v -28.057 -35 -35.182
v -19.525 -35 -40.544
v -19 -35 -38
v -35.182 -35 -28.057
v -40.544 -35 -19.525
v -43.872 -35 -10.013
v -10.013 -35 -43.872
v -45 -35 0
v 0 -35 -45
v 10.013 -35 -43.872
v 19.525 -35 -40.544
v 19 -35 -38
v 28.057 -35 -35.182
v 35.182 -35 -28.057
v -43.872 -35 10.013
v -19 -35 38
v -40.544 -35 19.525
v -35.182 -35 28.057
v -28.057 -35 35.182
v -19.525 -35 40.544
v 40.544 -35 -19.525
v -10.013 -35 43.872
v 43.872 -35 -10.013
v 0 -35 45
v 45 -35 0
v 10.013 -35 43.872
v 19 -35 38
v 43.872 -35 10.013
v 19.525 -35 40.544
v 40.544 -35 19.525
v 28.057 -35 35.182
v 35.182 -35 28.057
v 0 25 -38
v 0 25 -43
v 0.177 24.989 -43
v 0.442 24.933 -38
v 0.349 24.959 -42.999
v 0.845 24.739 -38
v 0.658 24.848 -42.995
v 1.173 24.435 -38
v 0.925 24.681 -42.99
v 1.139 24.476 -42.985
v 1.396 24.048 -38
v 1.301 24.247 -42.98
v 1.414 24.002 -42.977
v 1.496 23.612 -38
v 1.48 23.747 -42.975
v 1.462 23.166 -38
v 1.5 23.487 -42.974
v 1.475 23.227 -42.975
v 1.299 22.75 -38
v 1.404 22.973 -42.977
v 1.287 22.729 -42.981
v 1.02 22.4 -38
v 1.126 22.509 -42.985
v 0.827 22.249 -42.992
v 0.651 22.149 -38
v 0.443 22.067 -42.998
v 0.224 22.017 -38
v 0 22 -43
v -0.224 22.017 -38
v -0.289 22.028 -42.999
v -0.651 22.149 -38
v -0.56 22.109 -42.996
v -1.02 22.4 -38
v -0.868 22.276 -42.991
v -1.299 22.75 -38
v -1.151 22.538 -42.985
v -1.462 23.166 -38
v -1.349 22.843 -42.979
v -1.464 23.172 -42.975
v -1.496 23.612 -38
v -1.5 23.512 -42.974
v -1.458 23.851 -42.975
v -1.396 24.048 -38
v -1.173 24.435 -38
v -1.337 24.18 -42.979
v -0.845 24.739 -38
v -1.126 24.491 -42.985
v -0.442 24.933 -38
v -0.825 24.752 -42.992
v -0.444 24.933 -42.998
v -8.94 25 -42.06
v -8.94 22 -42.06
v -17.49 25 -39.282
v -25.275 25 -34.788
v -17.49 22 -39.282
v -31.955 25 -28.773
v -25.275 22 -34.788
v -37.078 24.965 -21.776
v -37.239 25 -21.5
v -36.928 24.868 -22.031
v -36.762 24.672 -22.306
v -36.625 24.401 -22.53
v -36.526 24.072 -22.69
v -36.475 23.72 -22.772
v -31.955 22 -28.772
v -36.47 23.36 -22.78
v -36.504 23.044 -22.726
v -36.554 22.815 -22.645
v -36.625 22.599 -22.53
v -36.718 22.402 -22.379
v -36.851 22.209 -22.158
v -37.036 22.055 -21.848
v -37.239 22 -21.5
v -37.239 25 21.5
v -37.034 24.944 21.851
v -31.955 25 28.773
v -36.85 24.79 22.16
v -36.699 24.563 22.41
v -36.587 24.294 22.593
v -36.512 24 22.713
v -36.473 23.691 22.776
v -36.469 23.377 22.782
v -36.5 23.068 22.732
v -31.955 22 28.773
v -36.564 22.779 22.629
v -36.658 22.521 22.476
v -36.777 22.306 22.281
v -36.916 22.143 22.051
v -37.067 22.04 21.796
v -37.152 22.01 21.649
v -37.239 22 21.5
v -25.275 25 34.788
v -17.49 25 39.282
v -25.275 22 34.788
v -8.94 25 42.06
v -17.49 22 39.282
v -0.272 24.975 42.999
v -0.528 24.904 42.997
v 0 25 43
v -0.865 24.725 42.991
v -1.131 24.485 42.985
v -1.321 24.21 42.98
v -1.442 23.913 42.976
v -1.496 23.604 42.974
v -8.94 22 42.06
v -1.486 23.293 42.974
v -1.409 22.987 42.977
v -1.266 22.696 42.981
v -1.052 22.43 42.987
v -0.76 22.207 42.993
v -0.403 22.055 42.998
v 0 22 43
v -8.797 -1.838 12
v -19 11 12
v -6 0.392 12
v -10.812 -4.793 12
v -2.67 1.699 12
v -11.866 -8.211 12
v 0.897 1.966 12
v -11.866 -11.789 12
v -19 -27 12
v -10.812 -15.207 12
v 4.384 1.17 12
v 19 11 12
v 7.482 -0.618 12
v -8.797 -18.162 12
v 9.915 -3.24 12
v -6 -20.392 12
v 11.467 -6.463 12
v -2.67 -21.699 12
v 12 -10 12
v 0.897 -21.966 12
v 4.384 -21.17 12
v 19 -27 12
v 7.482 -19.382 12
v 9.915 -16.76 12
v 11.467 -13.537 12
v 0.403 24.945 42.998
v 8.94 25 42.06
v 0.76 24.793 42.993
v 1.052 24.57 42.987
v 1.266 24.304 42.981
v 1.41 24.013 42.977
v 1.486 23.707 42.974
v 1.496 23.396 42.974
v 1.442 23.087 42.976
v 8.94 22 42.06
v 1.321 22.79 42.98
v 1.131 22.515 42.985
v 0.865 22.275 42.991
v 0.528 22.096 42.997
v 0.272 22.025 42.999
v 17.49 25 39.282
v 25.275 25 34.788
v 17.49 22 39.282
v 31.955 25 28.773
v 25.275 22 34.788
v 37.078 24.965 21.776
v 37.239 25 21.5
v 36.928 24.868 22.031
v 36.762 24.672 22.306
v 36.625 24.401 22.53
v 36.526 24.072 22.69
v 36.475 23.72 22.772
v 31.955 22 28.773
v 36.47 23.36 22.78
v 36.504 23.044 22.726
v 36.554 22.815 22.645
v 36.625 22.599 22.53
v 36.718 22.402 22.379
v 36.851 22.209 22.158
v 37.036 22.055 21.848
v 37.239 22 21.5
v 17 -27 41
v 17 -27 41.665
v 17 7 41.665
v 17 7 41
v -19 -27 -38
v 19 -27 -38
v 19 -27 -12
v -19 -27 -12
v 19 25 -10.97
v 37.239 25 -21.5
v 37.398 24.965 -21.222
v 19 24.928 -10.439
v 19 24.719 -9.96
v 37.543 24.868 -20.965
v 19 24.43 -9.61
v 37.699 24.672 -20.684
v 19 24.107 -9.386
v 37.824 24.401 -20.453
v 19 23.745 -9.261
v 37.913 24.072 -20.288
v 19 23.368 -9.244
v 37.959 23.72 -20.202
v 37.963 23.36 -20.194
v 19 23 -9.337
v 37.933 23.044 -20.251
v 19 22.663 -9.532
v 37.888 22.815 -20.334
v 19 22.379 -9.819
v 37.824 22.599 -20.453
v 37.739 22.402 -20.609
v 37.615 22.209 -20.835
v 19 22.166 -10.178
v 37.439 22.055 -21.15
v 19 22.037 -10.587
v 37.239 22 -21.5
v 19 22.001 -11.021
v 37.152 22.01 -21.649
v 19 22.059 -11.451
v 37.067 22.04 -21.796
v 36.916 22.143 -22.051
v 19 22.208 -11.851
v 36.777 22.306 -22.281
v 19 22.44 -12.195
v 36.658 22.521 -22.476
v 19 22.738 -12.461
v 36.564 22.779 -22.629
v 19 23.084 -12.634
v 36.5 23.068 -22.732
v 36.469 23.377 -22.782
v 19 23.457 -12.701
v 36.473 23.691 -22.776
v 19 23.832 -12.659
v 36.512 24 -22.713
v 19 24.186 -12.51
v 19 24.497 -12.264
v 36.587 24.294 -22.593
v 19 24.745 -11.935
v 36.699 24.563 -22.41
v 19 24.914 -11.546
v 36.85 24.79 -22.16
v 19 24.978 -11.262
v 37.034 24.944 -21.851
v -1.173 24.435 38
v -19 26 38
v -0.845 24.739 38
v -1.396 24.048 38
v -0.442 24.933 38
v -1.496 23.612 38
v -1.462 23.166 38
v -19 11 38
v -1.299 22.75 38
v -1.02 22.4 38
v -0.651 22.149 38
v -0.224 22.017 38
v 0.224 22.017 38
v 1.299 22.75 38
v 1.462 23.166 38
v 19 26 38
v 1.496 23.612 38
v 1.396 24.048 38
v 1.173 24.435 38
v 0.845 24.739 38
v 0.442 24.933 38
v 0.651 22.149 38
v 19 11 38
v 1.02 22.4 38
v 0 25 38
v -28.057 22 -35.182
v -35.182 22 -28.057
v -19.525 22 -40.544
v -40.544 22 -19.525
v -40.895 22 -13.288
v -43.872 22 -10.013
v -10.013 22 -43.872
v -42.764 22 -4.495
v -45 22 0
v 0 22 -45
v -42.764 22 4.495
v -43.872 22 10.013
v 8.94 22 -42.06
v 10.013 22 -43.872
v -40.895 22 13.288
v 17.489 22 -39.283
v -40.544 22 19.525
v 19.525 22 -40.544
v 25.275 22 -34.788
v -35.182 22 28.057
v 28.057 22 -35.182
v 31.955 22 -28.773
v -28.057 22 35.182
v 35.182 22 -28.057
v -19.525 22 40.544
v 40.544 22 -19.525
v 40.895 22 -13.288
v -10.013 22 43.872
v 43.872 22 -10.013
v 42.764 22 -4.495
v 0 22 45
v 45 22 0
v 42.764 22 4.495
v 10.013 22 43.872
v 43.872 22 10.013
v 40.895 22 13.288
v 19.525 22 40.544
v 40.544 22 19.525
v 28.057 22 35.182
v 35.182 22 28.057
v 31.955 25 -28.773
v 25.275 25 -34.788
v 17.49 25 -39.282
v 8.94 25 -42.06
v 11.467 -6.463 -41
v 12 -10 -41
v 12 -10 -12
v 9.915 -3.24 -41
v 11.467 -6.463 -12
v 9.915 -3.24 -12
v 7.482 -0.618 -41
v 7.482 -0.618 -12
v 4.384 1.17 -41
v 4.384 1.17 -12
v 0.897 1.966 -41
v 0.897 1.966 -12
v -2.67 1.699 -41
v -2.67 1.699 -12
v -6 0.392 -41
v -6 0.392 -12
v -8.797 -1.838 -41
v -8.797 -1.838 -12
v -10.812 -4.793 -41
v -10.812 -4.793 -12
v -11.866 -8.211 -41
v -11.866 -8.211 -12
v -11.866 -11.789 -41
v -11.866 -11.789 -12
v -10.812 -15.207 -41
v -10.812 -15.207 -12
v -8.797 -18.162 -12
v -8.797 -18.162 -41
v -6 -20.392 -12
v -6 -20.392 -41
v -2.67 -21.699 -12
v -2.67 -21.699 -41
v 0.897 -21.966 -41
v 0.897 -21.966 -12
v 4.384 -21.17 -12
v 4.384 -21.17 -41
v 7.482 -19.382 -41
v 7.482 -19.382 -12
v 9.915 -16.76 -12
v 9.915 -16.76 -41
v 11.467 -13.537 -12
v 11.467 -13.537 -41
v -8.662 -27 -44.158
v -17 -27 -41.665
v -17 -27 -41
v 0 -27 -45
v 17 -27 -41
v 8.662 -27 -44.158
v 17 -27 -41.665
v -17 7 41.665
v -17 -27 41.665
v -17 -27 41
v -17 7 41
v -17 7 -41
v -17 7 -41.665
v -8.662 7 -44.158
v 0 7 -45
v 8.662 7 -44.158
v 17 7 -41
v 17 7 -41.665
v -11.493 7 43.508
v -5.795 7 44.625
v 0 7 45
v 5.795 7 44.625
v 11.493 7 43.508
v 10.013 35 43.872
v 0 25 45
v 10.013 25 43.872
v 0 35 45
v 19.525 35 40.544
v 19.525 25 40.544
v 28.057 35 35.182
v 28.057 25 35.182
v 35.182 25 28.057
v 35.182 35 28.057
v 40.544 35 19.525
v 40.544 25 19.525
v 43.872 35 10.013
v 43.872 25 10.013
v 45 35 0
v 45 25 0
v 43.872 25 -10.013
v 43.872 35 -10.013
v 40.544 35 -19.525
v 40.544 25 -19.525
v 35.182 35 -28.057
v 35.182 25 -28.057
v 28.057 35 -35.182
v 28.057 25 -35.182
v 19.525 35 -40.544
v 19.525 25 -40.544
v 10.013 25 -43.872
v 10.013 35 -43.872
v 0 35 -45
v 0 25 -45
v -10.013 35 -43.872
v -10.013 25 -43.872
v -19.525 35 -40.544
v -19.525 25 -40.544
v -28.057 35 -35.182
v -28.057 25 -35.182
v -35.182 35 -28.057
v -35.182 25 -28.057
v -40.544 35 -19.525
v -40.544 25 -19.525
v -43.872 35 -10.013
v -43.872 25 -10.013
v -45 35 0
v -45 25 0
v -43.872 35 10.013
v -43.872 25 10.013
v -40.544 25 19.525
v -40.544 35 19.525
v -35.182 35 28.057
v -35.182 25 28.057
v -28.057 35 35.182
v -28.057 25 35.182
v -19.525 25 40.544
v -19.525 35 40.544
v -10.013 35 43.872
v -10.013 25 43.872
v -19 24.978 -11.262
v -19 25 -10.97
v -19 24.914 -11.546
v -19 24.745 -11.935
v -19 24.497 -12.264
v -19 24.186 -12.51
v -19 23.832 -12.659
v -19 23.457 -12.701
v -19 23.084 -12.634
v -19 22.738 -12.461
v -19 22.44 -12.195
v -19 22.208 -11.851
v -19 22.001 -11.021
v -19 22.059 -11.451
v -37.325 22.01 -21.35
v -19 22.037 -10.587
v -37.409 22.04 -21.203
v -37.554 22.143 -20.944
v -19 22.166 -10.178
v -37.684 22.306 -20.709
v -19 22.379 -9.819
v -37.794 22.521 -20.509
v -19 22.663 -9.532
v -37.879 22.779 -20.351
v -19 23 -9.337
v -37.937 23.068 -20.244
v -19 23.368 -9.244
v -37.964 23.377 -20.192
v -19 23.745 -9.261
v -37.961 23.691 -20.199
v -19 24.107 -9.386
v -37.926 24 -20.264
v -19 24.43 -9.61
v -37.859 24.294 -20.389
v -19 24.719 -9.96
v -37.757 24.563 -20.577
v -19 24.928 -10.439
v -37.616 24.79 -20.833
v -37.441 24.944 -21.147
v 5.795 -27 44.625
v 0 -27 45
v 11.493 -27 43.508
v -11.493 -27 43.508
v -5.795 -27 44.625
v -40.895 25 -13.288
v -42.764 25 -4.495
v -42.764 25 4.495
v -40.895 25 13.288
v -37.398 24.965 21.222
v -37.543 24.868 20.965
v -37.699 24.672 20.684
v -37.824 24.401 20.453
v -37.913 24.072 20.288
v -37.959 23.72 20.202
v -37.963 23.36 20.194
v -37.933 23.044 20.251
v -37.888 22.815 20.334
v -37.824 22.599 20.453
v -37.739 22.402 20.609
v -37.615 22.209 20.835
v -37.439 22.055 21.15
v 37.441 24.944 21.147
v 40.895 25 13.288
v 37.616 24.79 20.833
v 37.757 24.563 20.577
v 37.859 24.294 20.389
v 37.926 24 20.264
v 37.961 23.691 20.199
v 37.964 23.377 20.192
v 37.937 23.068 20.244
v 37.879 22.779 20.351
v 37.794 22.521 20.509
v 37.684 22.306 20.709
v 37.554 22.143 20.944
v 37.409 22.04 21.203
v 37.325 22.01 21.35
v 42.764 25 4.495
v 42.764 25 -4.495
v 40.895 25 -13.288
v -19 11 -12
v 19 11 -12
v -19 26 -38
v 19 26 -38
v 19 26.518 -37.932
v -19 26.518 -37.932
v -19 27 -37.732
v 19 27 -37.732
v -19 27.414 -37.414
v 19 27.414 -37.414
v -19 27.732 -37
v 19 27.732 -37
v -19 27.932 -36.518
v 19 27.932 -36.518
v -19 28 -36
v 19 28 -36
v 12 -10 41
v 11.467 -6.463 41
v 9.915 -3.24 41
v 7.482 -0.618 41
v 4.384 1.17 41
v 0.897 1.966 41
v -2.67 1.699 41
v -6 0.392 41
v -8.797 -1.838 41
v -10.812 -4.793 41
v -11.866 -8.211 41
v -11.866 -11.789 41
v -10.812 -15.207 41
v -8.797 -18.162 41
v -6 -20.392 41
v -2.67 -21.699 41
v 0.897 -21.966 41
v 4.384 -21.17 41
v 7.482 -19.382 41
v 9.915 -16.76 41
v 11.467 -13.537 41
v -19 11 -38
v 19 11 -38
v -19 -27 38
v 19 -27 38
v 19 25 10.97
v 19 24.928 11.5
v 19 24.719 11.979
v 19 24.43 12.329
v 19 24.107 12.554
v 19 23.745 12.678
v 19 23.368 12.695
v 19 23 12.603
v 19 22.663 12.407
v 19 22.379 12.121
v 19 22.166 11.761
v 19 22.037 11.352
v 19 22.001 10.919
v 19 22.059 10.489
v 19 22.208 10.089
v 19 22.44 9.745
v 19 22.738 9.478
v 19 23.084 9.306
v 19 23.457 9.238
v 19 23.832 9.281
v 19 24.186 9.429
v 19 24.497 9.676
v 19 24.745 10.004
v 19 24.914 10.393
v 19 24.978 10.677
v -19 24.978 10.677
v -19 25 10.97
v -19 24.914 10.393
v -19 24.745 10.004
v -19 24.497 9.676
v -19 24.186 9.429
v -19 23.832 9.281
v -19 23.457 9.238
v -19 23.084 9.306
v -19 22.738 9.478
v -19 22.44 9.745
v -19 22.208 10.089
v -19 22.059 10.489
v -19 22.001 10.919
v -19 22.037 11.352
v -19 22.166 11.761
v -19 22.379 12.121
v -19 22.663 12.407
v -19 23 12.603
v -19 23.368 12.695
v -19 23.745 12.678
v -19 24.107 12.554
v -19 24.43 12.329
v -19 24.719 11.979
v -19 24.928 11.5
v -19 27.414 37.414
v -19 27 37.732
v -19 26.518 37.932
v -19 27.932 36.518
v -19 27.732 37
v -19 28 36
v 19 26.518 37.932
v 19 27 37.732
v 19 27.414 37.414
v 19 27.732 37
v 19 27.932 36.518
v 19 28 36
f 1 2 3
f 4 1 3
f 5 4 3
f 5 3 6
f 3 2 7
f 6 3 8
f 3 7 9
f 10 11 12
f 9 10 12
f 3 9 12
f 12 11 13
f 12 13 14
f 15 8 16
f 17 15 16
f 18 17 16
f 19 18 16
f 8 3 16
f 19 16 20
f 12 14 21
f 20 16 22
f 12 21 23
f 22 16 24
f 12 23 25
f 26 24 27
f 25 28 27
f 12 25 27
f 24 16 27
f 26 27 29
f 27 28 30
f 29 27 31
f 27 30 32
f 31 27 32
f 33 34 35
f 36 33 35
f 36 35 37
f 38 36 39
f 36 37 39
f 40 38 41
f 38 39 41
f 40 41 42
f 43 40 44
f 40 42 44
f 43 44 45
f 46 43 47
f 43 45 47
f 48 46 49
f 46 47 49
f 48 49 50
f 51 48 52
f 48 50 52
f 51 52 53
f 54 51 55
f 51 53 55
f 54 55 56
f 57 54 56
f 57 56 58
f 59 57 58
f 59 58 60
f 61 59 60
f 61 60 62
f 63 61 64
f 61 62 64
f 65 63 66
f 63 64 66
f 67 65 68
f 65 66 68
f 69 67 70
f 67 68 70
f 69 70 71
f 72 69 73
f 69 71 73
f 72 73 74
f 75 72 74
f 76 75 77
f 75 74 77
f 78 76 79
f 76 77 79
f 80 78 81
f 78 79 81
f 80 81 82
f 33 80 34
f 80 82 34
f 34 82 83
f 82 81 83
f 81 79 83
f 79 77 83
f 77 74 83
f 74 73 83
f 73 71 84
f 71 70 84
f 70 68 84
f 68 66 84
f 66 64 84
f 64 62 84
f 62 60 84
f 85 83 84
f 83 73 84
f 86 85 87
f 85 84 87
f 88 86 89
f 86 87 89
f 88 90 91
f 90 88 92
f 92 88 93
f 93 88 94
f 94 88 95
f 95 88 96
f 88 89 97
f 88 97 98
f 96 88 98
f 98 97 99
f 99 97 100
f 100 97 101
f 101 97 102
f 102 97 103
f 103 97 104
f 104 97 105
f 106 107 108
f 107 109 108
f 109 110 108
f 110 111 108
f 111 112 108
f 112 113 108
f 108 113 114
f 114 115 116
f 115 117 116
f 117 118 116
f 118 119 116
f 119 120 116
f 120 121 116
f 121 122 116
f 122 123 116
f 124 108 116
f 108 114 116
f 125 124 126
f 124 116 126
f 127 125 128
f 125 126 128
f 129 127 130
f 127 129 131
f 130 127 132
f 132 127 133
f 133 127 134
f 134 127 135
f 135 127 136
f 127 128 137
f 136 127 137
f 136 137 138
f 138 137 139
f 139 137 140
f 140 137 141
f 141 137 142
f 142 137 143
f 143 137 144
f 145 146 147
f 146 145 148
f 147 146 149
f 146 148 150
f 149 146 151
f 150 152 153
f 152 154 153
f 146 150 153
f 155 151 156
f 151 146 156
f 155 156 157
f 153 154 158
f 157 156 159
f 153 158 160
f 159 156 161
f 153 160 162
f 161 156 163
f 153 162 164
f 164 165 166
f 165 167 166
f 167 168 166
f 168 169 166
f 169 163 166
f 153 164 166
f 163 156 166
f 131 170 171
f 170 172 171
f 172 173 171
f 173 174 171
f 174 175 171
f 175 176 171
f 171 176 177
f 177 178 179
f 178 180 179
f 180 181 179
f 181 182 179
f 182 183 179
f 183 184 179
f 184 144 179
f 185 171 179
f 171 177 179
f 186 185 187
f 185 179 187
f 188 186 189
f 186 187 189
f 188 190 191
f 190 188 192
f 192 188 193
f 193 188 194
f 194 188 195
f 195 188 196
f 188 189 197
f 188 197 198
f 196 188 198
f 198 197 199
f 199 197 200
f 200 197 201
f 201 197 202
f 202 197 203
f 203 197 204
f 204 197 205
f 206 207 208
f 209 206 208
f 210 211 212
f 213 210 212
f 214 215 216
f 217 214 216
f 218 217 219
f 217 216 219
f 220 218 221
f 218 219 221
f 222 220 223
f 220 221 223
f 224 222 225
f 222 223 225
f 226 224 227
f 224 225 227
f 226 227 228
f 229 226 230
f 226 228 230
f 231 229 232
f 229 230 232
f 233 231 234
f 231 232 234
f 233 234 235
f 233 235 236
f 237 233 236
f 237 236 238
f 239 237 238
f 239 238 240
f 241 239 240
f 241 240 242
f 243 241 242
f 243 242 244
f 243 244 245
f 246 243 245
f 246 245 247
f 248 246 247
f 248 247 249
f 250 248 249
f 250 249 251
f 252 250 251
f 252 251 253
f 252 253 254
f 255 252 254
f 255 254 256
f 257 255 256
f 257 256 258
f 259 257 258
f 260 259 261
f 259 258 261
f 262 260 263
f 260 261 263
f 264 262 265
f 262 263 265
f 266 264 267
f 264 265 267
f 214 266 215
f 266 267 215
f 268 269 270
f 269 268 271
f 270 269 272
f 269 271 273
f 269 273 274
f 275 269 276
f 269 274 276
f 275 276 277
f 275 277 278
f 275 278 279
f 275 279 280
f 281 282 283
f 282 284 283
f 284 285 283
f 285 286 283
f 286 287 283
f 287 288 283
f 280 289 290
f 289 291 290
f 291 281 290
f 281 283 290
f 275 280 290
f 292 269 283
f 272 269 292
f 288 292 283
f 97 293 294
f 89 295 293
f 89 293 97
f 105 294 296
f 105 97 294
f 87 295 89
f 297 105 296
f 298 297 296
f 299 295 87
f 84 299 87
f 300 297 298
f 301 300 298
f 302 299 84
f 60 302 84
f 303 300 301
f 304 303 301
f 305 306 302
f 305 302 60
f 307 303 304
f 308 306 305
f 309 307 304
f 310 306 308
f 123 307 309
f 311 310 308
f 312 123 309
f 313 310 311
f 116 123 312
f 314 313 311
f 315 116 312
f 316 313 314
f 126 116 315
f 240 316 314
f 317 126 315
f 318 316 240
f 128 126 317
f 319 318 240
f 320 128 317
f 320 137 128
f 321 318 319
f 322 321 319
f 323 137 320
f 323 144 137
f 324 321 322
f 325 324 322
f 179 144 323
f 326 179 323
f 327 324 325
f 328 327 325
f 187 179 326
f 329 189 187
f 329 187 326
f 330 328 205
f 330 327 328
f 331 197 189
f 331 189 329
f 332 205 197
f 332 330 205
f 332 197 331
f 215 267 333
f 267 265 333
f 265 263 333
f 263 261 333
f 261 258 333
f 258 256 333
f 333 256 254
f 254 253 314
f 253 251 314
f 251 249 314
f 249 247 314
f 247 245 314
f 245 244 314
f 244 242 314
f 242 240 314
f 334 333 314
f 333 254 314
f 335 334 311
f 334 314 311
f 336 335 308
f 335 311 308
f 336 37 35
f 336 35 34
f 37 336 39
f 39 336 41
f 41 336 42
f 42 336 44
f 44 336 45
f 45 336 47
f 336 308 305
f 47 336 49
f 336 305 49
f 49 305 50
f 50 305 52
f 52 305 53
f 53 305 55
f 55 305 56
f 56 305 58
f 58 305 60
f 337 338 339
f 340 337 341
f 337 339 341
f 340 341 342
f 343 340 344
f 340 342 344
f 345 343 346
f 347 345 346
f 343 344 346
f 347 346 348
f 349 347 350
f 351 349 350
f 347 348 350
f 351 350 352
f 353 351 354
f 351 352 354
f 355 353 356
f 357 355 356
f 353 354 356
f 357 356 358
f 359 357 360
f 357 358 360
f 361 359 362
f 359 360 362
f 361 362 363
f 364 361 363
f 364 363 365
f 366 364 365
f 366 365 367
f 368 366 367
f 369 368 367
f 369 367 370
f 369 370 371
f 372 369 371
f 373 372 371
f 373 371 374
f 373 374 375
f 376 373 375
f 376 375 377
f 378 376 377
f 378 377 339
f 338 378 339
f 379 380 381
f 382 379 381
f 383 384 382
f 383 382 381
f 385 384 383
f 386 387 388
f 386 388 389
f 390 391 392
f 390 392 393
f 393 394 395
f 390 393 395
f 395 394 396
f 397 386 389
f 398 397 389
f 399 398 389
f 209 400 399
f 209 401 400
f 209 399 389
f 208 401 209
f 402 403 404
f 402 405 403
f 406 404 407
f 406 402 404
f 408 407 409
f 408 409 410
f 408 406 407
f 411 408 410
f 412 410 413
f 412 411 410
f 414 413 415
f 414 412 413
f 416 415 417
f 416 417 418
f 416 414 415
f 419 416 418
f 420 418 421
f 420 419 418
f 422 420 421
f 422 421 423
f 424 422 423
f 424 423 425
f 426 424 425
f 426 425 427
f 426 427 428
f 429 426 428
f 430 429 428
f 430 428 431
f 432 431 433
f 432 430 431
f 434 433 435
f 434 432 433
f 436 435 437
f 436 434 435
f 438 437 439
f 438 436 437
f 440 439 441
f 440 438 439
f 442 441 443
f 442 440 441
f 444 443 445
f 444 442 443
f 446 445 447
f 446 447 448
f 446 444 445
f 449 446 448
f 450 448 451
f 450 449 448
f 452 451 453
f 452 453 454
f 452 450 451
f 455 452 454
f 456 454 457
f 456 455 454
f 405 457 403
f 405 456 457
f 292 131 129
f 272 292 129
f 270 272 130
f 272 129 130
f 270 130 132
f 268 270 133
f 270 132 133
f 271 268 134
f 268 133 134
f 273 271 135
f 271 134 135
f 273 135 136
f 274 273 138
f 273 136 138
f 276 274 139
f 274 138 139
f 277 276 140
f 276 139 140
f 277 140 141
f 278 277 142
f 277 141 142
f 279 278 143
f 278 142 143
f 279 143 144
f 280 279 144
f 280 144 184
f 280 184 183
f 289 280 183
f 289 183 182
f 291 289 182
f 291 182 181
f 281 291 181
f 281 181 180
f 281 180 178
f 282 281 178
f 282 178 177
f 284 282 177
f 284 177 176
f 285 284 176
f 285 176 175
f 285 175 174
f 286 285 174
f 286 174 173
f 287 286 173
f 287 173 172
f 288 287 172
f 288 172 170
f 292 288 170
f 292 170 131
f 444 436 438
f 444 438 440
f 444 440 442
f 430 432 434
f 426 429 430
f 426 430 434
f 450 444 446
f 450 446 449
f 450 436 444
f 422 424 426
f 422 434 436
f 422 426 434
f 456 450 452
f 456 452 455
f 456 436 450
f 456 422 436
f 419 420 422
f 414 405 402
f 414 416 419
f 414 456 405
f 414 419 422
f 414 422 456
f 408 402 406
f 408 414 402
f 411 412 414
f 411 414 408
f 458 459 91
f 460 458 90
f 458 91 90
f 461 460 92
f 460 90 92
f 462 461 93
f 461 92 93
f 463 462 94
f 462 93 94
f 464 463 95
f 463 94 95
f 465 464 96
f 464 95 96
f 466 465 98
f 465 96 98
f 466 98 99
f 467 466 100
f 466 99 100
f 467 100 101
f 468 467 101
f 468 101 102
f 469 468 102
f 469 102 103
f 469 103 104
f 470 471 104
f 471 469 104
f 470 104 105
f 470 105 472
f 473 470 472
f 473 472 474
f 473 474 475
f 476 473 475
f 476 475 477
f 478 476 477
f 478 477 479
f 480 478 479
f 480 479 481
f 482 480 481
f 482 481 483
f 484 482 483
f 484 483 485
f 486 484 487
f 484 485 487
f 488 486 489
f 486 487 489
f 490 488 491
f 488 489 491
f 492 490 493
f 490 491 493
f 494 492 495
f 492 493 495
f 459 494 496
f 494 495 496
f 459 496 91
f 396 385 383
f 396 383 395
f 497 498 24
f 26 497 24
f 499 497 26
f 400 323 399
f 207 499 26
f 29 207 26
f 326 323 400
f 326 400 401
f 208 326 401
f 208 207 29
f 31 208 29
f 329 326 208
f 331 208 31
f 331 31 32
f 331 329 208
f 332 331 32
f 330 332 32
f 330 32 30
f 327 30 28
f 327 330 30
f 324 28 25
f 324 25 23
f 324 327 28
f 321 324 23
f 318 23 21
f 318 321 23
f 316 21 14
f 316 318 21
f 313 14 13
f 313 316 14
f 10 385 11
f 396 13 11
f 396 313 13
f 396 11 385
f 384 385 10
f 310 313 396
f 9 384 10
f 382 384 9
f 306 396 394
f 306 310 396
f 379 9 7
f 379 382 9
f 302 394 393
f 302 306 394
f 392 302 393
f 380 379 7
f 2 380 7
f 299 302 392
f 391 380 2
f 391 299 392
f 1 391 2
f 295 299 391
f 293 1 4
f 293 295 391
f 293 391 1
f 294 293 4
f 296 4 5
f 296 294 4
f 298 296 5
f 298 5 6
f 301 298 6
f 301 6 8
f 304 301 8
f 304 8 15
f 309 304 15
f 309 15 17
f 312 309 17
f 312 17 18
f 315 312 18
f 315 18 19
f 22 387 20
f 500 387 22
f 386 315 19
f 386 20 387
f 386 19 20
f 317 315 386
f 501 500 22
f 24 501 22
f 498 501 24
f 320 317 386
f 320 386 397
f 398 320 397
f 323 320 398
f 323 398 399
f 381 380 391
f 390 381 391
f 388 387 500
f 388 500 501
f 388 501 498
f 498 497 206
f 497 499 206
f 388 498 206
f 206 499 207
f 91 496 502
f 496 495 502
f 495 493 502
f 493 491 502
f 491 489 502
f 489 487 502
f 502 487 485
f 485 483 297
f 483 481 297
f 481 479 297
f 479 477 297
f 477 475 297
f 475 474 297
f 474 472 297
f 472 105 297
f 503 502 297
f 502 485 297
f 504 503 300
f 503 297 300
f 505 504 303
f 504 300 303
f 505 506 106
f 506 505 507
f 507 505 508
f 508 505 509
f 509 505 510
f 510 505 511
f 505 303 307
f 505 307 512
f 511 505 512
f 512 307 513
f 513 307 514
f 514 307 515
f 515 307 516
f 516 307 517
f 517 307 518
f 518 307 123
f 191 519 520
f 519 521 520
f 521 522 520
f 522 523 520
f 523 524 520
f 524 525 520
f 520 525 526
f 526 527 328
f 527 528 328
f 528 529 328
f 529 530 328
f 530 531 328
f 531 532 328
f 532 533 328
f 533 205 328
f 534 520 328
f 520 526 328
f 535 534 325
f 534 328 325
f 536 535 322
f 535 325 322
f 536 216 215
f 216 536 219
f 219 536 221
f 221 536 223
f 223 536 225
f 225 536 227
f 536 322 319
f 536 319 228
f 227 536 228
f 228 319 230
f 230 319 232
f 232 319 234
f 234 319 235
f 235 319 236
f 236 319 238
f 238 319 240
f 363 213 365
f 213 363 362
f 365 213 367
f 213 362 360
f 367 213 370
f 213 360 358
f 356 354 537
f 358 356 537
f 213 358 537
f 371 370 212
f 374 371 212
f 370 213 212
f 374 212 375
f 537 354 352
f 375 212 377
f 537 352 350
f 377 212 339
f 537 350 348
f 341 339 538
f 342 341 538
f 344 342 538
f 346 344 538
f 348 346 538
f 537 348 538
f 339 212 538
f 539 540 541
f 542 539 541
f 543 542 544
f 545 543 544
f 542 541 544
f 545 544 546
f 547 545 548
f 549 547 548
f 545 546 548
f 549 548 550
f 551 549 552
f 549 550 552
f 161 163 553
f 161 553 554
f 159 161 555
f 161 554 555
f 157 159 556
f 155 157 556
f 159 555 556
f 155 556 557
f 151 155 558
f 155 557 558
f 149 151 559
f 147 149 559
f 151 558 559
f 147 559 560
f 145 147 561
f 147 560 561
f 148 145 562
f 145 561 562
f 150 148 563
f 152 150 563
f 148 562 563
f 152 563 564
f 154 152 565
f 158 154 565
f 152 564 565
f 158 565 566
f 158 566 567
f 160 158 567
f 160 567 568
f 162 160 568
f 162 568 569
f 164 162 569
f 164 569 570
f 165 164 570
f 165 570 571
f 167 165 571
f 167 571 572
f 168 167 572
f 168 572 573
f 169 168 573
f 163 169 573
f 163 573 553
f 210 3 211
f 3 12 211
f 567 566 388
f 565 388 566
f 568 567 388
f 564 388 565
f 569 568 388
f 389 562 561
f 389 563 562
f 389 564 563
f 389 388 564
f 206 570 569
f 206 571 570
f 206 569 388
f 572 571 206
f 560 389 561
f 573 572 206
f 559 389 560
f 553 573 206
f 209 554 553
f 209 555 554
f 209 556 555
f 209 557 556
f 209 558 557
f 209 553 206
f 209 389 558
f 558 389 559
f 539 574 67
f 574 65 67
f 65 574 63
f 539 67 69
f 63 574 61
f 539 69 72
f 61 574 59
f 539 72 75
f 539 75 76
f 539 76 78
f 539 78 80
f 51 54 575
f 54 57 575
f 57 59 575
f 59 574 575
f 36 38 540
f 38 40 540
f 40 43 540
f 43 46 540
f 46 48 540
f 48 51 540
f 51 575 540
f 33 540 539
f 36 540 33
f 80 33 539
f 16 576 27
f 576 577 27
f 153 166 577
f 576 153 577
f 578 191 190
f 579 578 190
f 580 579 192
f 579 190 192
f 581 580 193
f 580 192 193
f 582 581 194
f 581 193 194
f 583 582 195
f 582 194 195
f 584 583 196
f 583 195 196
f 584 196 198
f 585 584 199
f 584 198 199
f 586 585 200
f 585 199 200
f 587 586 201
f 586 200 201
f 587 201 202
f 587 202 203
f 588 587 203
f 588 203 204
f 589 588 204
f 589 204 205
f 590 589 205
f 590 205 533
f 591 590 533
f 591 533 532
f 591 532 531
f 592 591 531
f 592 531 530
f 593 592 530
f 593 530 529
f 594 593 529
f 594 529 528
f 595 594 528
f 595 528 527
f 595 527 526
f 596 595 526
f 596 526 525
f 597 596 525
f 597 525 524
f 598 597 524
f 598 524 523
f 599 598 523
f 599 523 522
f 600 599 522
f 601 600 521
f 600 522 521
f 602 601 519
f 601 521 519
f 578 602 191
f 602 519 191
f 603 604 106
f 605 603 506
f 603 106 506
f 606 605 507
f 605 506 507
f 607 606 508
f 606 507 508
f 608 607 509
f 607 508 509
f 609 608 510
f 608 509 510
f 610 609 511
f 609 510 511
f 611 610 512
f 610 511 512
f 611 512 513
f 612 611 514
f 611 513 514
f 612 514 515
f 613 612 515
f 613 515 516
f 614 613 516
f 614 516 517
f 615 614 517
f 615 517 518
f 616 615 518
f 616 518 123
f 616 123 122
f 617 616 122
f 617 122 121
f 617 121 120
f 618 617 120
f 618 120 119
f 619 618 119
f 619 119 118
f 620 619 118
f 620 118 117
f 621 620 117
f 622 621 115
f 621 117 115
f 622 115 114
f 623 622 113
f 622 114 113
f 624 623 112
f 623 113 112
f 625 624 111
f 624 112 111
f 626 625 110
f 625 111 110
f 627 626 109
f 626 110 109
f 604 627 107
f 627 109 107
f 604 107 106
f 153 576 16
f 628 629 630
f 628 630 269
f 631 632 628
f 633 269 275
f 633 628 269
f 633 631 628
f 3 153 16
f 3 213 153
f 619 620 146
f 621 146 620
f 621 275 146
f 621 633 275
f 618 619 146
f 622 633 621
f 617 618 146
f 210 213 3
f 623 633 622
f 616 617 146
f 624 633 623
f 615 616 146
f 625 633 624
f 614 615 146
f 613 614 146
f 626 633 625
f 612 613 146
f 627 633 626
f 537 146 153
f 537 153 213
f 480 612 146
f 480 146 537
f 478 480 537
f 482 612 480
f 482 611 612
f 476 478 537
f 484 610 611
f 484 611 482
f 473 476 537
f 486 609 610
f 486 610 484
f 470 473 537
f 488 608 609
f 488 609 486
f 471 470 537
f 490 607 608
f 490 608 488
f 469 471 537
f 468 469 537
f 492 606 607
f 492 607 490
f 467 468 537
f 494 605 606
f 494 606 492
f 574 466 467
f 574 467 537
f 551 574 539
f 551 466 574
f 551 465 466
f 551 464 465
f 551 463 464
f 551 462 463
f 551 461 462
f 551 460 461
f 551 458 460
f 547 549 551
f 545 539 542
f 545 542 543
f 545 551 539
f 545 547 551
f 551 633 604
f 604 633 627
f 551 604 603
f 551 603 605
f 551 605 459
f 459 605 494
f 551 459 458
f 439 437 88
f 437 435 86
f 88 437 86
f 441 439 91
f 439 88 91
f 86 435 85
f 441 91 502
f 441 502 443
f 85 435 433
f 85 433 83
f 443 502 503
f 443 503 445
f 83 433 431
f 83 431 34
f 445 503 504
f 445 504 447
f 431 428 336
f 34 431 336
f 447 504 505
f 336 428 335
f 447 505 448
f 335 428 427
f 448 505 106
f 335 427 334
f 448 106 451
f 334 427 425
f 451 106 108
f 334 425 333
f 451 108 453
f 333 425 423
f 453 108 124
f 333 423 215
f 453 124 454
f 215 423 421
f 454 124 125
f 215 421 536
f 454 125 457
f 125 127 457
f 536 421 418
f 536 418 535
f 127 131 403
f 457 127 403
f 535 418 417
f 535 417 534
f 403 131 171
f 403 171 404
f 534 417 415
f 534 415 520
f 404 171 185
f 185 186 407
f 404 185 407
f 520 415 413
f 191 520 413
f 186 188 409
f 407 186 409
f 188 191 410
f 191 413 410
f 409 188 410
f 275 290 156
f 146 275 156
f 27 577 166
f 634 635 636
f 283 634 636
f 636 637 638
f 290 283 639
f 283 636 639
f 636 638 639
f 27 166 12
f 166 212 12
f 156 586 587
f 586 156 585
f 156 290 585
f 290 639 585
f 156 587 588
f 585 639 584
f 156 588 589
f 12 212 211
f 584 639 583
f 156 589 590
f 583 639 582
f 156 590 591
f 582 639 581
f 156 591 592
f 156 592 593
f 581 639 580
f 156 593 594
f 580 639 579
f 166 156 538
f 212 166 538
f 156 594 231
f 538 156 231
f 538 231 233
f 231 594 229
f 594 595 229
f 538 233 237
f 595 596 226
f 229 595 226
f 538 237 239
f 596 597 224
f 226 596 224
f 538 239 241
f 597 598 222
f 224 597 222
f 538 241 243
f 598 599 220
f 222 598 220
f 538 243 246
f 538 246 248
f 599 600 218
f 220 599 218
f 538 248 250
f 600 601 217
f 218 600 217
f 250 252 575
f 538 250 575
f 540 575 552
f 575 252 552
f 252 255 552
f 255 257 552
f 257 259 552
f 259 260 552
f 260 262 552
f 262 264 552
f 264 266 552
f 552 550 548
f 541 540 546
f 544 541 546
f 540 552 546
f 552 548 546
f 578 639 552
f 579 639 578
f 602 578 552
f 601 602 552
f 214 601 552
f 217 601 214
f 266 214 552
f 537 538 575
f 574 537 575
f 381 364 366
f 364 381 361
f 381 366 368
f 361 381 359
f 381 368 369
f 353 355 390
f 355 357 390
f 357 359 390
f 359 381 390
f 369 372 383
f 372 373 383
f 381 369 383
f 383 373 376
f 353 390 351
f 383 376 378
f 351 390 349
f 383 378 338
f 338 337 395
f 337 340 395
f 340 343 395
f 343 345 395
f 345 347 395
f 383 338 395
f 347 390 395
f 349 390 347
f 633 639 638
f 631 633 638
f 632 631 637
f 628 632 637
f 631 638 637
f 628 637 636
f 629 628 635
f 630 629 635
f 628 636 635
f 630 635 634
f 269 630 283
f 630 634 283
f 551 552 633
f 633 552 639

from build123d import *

# Parameters (mm, degrees)
IZIM1_R                     = 45
Y_KSEKLIK_EKSTR_ZYON1_DEPTH = 35
IZIM2_W                     = 34
IZIM2_H                     = 34
KES_EKSTR_ZYON1_DEPTH       = 4
IZIM5_R                     = 12
KES_EKSTR_ZYON2_DEPTH       = 107.536378763
KES_EKSTR_ZYON3_DEPTH       = 19
IZIM8_R                     = 45
IZIM8_R_2                   = 43
KES_EKSTR_ZYON4_DEPTH       = 1.5
KES_EKSTR_ZYON5_REACH       = 108.536
IZIM9_R                     = 1.5
DAIRESEL_KAPLAMA1_COUNT     = 6


with BuildPart() as part:
    # Çizim1 → Yükseklik-Ekstrüzyon1 (new, symmetric)
    with BuildSketch(Plane(origin=(0, 0, 0), x_dir=(1, 0, 0), z_dir=(0, 1, 0))):
        with Locations(Location((0, 0, 0), (0, 0, 270))):
            Circle(IZIM1_R)
    extrude(amount=Y_KSEKLIK_EKSTR_ZYON1_DEPTH, both=True)

    # Çizim2 → Kes-Ekstrüzyon1 (cut)
    with BuildSketch(Plane.XY.offset(45)):
        with Locations((0, -10)):
            Rectangle(IZIM2_W, IZIM2_H)
    kes_ekstr_zyon1 = extrude(amount=-KES_EKSTR_ZYON1_DEPTH, mode=Mode.SUBTRACT)

    # Aynalama1: Kes-Ekstrüzyon1 across plane
    add(kes_ekstr_zyon1.mirror(Plane.XY), mode=Mode.SUBTRACT)

    # Çizim5 → Kes-Ekstrüzyon2 (cut, through all)
    with BuildSketch(Plane.XY.offset(45)):
        with Locations((0, -10)):
            Circle(IZIM5_R)
    extrude(amount=-KES_EKSTR_ZYON2_DEPTH, mode=Mode.SUBTRACT)

    # Çizim7 → Kes-Ekstrüzyon3 (cut, symmetric)
    with BuildSketch(Plane(origin=(0, 0, 0), x_dir=(0, 0, -1), z_dir=(1, 0, 0))):
        with BuildLine():
            Line((38, -35), (38, -27))
            Line((38, -27), (12, -27))
            Line((12, -27), (12, 11))
            Line((12, 11), (38, 11))
            Line((38, 11), (38, 26))
            ThreePointArc((38, 26), (37.414213562, 27.414213562), (36, 28))
            Line((36, 28), (-36, 28))
            ThreePointArc((-36, 28), (-37.414213562, 27.414213562), (-38, 26))
            Line((-38, 26), (-38, 11))
            Line((-38, 11), (-11.999999881, 11))
            Line((-11.999999881, 11), (-11.999999881, -27))
            Line((-11.999999881, -27), (-38, -27))
            Line((-38, -27), (-38, -35))
            Line((-38, -35), (38, -35))
        make_face()
    extrude(amount=KES_EKSTR_ZYON3_DEPTH, both=True, mode=Mode.SUBTRACT)

    # Çizim8 → Kes-Ekstrüzyon4 (cut, symmetric)
    with BuildSketch(Plane(origin=(0, 23.5, 0), x_dir=(1, 0, 0), z_dir=(0, 1, 0))):
        with Locations(Location((0, 0, 0), (0, 0, 270))):
            Circle(IZIM8_R)
        with Locations(Location((0, 0, 0), (0, 0, 270))):
            Circle(IZIM8_R_2, mode=Mode.SUBTRACT)
    extrude(amount=KES_EKSTR_ZYON4_DEPTH, both=True, mode=Mode.SUBTRACT)

    # Çizim9 → Kes-Ekstrüzyon5 (cut, up to next)
    with BuildSketch(Plane.XY.offset(45), mode=Mode.PRIVATE) as kes_ekstr_zyon5_sk1:
        with Locations(Location((0, 23.5, 0), (0, 0, 90))):
            Circle(IZIM9_R)
    kes_ekstr_zyon5_tool1 = extrude(kes_ekstr_zyon5_sk1.sketch, amount=-KES_EKSTR_ZYON5_REACH, mode=Mode.PRIVATE) & part.part
    kes_ekstr_zyon5 = kes_ekstr_zyon5_tool1.solids().sort_by_distance((0, 23.5, 45))[0]
    add(kes_ekstr_zyon5, mode=Mode.SUBTRACT)

    # Dairesel Kaplama1: Kes-Ekstrüzyon5; each copy of Kes-Ekstrüzyon5 runs up to whatever stops it at its own place
    dairesel_kaplama1_before = part.part  # the part as the pattern finds it: every copy runs up to it
    dairesel_kaplama1_kes_ekstr_zyon5_long = extrude(kes_ekstr_zyon5_sk1.sketch, amount=-KES_EKSTR_ZYON5_REACH, mode=Mode.PRIVATE)
    dairesel_kaplama1_kes_ekstr_zyon5_tool = dairesel_kaplama1_kes_ekstr_zyon5_long.rotate(Axis((0, 25, 0), (0, 1, 0)), 1 * 360 / DAIRESEL_KAPLAMA1_COUNT) & dairesel_kaplama1_before
    add(dairesel_kaplama1_kes_ekstr_zyon5_tool.solids().sort_by_distance((38.971143, 23.5, 22.5))[0], mode=Mode.SUBTRACT)
    dairesel_kaplama1_kes_ekstr_zyon5_tool = dairesel_kaplama1_kes_ekstr_zyon5_long.rotate(Axis((0, 25, 0), (0, 1, 0)), 2 * 360 / DAIRESEL_KAPLAMA1_COUNT) & dairesel_kaplama1_before
    add(dairesel_kaplama1_kes_ekstr_zyon5_tool.solids().sort_by_distance((38.971143, 23.5, -22.5))[0], mode=Mode.SUBTRACT)
    dairesel_kaplama1_kes_ekstr_zyon5_tool = dairesel_kaplama1_kes_ekstr_zyon5_long.rotate(Axis((0, 25, 0), (0, 1, 0)), 3 * 360 / DAIRESEL_KAPLAMA1_COUNT) & dairesel_kaplama1_before
    add(dairesel_kaplama1_kes_ekstr_zyon5_tool.solids().sort_by_distance((0, 23.5, -45))[0], mode=Mode.SUBTRACT)
    dairesel_kaplama1_kes_ekstr_zyon5_tool = dairesel_kaplama1_kes_ekstr_zyon5_long.rotate(Axis((0, 25, 0), (0, 1, 0)), 4 * 360 / DAIRESEL_KAPLAMA1_COUNT) & dairesel_kaplama1_before
    add(dairesel_kaplama1_kes_ekstr_zyon5_tool.solids().sort_by_distance((-38.971143, 23.5, -22.5))[0], mode=Mode.SUBTRACT)
    dairesel_kaplama1_kes_ekstr_zyon5_tool = dairesel_kaplama1_kes_ekstr_zyon5_long.rotate(Axis((0, 25, 0), (0, 1, 0)), 5 * 360 / DAIRESEL_KAPLAMA1_COUNT) & dairesel_kaplama1_before
    add(dairesel_kaplama1_kes_ekstr_zyon5_tool.solids().sort_by_distance((-38.971143, 23.5, 22.5))[0], mode=Mode.SUBTRACT)


solid = part.part
